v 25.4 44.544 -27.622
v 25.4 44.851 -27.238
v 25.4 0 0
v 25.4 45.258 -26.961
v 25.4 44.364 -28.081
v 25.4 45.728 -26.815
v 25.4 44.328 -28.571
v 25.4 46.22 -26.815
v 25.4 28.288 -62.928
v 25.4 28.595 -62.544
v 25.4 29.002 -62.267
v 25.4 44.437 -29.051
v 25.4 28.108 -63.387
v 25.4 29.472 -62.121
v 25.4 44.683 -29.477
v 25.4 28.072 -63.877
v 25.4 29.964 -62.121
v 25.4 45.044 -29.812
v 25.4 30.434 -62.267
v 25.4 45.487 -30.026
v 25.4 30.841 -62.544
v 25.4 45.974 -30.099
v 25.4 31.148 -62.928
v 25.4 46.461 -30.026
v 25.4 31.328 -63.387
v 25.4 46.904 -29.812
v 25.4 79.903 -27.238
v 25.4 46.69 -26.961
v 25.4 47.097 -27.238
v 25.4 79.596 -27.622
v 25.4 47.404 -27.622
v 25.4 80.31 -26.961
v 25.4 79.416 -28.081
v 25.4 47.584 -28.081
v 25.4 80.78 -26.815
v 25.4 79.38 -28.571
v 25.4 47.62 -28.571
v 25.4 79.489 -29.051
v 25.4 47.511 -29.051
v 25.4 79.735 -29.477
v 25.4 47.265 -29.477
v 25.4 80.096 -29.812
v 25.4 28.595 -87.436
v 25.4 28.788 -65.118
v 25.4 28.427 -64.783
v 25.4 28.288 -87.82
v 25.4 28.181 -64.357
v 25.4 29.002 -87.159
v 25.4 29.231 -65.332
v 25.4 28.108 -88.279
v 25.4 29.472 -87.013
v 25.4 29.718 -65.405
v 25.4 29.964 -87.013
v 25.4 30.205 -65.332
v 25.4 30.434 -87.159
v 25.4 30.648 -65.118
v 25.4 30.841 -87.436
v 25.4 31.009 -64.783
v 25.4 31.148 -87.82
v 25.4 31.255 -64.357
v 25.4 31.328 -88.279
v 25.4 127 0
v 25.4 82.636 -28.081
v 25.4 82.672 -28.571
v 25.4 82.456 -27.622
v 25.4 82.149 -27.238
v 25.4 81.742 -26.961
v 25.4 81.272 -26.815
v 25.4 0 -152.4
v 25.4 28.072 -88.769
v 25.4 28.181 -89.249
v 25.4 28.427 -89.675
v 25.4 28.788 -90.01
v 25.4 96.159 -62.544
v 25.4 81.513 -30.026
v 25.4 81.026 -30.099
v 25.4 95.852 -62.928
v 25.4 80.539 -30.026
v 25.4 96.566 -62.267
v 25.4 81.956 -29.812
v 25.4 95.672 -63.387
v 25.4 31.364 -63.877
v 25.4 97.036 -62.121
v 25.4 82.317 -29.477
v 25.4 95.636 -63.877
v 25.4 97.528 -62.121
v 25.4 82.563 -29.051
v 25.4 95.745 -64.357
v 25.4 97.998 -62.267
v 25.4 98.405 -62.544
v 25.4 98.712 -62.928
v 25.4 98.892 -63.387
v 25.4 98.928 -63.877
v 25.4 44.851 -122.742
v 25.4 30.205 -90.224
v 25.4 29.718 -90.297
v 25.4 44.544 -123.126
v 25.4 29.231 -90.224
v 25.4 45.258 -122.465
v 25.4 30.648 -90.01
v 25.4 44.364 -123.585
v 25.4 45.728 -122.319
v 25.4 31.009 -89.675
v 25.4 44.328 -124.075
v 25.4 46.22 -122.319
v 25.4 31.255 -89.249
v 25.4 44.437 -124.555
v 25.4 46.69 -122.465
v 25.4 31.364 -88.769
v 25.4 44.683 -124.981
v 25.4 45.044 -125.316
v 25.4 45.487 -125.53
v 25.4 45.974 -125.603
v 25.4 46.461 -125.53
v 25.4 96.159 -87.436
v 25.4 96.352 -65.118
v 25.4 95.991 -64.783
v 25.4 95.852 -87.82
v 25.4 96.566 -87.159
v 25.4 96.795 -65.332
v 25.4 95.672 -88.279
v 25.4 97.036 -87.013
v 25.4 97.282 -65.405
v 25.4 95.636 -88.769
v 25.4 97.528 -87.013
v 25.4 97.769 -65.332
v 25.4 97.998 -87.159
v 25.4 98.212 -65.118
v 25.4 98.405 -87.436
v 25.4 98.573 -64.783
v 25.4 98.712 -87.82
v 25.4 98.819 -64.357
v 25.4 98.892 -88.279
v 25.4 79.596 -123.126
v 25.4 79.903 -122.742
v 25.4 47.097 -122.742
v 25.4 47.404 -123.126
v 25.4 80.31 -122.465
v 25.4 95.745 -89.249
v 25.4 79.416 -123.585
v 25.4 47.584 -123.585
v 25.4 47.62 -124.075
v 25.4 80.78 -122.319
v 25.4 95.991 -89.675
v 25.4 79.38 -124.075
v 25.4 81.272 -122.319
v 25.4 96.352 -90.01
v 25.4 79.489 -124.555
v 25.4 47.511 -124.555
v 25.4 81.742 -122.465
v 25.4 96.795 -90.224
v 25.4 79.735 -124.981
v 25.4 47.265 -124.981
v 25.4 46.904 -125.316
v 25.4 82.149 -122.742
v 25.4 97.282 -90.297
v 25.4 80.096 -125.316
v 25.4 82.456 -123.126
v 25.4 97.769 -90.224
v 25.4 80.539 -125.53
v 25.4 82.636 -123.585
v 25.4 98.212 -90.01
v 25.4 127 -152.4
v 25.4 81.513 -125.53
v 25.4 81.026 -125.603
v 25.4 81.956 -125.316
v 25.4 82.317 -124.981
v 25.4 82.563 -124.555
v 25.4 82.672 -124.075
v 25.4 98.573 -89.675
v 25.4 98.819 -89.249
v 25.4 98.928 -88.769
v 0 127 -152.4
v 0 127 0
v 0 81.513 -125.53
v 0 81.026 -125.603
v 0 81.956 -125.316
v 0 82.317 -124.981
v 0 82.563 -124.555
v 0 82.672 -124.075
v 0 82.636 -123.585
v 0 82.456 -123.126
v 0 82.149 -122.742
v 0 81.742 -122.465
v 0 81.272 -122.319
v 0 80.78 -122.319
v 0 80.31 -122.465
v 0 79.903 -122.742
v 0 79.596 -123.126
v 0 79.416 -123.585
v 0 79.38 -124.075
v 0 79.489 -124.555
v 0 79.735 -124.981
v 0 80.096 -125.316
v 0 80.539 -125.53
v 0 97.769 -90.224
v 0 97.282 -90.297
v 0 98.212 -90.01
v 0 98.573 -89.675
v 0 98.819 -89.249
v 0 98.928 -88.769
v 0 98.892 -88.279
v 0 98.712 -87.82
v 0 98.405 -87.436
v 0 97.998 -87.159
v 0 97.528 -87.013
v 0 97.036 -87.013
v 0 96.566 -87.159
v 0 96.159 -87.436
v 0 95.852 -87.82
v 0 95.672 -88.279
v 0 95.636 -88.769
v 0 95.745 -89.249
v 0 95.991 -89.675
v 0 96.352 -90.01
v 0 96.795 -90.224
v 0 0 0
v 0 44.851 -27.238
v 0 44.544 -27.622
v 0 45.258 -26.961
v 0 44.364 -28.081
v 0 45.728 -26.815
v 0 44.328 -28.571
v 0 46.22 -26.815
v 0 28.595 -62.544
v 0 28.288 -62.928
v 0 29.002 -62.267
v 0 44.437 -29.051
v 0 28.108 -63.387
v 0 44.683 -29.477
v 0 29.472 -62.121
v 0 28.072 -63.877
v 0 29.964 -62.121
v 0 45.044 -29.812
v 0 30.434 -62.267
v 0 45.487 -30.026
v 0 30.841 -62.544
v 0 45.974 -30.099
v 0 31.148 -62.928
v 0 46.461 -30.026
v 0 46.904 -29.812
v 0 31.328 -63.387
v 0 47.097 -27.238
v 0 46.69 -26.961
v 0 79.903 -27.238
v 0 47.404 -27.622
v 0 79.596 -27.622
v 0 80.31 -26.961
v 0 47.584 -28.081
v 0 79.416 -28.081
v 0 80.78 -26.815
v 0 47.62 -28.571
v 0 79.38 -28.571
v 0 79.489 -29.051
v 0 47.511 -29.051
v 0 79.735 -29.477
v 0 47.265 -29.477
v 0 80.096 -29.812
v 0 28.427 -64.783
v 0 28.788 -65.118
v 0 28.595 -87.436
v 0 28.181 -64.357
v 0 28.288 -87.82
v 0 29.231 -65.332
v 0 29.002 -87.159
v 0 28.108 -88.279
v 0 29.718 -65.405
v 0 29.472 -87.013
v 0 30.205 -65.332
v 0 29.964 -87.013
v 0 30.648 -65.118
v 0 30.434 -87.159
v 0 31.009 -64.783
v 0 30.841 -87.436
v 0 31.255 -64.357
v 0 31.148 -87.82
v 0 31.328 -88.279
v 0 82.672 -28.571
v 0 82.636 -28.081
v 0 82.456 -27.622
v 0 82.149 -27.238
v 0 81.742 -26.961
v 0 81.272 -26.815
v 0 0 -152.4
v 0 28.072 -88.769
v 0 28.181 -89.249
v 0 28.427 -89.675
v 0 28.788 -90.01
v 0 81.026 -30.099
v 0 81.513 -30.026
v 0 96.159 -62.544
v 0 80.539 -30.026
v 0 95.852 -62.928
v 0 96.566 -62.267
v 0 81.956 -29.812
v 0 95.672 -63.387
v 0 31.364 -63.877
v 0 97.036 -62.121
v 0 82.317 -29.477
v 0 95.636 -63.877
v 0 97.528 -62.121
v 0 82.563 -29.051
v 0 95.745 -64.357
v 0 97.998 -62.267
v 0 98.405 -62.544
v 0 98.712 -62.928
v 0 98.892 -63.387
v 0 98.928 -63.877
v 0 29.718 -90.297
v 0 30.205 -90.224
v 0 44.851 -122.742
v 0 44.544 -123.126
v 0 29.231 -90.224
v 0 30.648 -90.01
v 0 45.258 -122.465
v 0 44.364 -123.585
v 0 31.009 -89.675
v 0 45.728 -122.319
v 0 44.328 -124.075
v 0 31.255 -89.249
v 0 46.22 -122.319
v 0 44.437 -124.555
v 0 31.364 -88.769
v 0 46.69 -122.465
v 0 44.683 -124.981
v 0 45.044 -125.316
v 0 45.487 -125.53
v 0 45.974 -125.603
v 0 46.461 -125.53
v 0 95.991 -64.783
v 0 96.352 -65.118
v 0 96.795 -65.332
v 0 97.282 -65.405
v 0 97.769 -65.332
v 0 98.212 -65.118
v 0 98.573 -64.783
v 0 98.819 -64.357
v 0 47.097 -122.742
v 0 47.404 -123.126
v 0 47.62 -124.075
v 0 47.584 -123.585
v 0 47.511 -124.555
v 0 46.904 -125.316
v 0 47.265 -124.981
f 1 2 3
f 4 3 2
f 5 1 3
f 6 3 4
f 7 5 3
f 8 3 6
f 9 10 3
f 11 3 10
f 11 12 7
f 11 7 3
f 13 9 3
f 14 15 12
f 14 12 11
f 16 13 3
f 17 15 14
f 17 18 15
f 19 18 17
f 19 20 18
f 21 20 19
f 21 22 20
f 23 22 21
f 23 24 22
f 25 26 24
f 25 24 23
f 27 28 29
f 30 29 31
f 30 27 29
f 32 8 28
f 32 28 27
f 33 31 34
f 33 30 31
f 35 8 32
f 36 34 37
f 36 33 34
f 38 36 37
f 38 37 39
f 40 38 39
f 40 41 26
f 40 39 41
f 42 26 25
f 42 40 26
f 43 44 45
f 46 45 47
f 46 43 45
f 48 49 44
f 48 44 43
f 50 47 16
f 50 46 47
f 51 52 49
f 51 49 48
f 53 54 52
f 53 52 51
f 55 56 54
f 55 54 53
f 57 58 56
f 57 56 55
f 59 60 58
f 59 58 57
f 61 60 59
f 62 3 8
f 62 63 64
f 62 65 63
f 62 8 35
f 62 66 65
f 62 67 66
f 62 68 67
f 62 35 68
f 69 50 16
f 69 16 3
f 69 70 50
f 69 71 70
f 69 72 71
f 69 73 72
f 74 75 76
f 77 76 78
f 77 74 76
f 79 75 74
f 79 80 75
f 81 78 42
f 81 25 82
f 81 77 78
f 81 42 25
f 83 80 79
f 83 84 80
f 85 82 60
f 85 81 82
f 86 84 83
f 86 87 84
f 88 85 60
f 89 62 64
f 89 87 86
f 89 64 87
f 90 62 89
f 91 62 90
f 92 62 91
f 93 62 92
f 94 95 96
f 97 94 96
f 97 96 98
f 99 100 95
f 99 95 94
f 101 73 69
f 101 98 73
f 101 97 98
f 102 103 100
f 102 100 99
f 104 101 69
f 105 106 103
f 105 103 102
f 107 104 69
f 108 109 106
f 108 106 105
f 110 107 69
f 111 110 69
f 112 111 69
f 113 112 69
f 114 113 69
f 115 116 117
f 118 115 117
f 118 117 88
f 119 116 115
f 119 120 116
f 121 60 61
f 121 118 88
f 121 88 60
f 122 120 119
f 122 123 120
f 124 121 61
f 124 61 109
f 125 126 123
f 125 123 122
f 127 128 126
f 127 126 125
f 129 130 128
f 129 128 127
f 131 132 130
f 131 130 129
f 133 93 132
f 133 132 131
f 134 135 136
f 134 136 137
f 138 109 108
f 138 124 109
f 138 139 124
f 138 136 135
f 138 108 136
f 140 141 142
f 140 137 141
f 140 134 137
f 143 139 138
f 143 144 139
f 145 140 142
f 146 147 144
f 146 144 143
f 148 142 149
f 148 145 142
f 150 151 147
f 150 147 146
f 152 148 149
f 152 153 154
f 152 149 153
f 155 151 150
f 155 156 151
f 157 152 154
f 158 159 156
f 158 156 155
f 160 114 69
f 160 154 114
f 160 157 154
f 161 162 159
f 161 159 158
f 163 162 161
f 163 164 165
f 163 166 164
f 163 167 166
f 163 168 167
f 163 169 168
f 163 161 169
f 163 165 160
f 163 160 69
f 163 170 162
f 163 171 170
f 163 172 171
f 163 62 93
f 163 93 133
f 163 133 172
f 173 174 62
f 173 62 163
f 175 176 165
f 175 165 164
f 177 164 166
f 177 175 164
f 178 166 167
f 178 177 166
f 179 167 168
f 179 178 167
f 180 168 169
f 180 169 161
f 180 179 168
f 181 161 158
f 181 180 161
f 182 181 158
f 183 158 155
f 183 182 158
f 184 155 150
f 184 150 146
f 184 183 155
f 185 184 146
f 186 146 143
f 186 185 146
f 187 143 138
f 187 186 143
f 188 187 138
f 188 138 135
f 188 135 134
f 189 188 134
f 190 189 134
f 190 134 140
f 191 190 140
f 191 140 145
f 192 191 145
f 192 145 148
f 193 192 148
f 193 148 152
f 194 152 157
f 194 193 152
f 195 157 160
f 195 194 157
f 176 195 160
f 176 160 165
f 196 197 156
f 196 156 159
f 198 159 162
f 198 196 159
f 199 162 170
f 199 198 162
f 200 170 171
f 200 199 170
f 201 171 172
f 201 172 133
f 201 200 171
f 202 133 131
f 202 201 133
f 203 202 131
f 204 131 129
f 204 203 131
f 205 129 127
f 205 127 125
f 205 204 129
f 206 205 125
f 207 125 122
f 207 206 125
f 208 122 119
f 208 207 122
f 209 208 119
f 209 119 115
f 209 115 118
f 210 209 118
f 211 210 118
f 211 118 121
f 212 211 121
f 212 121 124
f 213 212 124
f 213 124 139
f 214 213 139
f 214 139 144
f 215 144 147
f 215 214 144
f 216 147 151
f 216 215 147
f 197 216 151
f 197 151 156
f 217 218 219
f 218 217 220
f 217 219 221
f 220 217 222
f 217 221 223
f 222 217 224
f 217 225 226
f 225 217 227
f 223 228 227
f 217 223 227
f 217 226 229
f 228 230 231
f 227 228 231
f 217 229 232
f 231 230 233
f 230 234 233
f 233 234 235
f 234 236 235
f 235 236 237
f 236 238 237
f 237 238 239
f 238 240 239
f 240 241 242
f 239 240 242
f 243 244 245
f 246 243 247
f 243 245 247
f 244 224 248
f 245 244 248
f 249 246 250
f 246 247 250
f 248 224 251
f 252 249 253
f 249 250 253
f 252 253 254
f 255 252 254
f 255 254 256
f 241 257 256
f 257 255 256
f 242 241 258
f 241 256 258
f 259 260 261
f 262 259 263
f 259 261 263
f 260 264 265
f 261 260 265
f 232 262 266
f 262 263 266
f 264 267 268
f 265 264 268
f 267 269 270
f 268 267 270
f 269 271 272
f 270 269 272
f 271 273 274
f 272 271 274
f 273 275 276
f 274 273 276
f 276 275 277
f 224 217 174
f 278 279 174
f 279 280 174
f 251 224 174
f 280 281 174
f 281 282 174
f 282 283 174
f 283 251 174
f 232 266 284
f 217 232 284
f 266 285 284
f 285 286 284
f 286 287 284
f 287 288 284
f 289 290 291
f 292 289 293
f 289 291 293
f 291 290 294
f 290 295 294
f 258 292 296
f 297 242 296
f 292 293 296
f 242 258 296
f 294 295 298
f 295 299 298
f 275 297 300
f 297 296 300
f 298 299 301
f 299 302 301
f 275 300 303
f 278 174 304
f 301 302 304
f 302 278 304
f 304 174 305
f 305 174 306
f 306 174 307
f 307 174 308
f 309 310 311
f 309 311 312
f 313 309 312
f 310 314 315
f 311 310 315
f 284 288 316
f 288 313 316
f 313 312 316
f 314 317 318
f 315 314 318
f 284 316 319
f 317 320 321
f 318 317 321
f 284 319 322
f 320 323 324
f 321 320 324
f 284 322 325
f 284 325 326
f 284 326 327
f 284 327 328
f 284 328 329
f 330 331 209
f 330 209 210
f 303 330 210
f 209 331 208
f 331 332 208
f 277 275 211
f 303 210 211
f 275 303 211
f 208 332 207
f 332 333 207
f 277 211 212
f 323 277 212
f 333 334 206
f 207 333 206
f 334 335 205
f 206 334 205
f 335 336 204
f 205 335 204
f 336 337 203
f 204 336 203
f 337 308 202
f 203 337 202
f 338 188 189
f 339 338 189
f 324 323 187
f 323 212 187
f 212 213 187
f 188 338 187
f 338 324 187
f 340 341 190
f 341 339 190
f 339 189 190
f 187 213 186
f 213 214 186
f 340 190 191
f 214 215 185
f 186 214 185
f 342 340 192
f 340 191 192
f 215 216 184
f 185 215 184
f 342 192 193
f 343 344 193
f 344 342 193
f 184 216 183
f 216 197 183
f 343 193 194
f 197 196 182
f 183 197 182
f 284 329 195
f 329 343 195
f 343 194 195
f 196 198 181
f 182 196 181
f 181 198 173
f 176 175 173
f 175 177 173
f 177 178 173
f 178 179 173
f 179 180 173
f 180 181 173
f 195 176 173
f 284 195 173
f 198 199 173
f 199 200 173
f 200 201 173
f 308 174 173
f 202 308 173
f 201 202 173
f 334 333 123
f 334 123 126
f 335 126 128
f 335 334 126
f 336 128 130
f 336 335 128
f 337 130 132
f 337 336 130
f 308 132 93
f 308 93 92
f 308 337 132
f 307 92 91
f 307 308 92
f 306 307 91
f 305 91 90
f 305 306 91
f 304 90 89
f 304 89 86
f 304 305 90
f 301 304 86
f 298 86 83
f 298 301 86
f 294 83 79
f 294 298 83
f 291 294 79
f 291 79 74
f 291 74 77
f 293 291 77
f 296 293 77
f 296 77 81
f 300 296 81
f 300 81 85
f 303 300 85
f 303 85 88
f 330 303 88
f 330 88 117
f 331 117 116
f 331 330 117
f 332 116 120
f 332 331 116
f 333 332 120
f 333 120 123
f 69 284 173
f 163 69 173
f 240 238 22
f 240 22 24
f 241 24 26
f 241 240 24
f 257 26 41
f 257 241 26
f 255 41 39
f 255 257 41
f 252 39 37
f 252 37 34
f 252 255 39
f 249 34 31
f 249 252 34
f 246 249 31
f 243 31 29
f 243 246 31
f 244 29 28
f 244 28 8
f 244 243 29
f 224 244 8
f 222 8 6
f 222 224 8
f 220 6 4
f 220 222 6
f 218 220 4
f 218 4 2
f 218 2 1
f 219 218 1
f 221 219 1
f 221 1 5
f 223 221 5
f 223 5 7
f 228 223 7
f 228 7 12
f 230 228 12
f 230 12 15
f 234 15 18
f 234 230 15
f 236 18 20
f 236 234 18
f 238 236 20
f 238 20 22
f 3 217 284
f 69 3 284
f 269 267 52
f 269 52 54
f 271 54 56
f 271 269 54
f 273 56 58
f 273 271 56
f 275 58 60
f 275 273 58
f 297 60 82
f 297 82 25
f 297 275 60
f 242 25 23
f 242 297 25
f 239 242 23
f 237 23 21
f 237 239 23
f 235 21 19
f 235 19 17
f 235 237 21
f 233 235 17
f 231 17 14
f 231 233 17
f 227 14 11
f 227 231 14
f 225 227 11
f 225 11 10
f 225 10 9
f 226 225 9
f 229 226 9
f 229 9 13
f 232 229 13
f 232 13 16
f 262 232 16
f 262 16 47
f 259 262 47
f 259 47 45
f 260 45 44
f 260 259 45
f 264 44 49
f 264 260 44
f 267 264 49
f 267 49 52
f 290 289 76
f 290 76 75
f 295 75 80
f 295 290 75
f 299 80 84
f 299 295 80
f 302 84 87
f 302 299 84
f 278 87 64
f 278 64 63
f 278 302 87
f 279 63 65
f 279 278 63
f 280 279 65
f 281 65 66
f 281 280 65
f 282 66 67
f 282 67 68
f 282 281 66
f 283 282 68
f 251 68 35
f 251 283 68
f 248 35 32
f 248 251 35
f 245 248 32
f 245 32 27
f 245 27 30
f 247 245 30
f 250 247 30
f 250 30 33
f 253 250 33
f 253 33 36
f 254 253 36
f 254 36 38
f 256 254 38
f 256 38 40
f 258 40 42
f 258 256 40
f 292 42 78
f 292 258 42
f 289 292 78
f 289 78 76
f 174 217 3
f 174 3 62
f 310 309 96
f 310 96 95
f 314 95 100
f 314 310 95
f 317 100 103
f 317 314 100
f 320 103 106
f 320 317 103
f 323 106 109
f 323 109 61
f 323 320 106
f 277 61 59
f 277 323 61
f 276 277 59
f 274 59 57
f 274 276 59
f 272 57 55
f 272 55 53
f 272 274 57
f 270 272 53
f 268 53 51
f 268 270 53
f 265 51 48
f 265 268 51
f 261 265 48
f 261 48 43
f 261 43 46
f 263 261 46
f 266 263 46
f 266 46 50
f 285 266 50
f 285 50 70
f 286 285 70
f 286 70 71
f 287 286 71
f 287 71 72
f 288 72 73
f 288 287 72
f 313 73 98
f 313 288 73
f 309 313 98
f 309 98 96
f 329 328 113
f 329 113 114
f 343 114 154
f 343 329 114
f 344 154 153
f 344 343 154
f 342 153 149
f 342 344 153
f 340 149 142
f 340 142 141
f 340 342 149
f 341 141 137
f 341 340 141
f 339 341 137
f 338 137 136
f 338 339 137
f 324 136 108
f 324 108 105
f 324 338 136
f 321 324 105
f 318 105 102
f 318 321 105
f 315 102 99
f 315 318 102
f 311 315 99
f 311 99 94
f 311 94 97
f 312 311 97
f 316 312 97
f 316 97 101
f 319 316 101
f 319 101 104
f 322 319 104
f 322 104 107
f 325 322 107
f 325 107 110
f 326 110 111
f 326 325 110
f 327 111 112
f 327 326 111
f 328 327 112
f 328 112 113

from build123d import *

# Parameters (mm, degrees)
SKETCH1_W           = 152.4
SKETCH1_H           = 127
SKETCH1_R           = 1.651
BOSS_EXTRUDE1_DEPTH = 25.4


with BuildPart() as part:
    # Sketch1 → Boss-Extrude1 (new body)
    with BuildSketch(Plane(origin=(0, 0, 0), x_dir=(0, 0, -1), z_dir=(1, 0, 0))):
        with Locations((76.2, 63.5)):
            Rectangle(SKETCH1_W, SKETCH1_H)
        with Locations((28.448, 81.026)):
            Circle(SKETCH1_R, mode=Mode.SUBTRACT)
        with Locations((28.448, 45.974)):
            Circle(SKETCH1_R, mode=Mode.SUBTRACT)
        with Locations((123.952, 81.026)):
            Circle(SKETCH1_R, mode=Mode.SUBTRACT)
        with Locations((123.952, 45.974)):
            Circle(SKETCH1_R, mode=Mode.SUBTRACT)
        with Locations((63.754, 97.282)):
            Circle(SKETCH1_R, mode=Mode.SUBTRACT)
        with Locations((88.646, 97.282)):
            Circle(SKETCH1_R, mode=Mode.SUBTRACT)
        with Locations((63.754, 29.718)):
            Circle(SKETCH1_R, mode=Mode.SUBTRACT)
        with Locations((88.646, 29.718)):
            Circle(SKETCH1_R, mode=Mode.SUBTRACT)
    extrude(amount=BOSS_EXTRUDE1_DEPTH)


solid = part.part
